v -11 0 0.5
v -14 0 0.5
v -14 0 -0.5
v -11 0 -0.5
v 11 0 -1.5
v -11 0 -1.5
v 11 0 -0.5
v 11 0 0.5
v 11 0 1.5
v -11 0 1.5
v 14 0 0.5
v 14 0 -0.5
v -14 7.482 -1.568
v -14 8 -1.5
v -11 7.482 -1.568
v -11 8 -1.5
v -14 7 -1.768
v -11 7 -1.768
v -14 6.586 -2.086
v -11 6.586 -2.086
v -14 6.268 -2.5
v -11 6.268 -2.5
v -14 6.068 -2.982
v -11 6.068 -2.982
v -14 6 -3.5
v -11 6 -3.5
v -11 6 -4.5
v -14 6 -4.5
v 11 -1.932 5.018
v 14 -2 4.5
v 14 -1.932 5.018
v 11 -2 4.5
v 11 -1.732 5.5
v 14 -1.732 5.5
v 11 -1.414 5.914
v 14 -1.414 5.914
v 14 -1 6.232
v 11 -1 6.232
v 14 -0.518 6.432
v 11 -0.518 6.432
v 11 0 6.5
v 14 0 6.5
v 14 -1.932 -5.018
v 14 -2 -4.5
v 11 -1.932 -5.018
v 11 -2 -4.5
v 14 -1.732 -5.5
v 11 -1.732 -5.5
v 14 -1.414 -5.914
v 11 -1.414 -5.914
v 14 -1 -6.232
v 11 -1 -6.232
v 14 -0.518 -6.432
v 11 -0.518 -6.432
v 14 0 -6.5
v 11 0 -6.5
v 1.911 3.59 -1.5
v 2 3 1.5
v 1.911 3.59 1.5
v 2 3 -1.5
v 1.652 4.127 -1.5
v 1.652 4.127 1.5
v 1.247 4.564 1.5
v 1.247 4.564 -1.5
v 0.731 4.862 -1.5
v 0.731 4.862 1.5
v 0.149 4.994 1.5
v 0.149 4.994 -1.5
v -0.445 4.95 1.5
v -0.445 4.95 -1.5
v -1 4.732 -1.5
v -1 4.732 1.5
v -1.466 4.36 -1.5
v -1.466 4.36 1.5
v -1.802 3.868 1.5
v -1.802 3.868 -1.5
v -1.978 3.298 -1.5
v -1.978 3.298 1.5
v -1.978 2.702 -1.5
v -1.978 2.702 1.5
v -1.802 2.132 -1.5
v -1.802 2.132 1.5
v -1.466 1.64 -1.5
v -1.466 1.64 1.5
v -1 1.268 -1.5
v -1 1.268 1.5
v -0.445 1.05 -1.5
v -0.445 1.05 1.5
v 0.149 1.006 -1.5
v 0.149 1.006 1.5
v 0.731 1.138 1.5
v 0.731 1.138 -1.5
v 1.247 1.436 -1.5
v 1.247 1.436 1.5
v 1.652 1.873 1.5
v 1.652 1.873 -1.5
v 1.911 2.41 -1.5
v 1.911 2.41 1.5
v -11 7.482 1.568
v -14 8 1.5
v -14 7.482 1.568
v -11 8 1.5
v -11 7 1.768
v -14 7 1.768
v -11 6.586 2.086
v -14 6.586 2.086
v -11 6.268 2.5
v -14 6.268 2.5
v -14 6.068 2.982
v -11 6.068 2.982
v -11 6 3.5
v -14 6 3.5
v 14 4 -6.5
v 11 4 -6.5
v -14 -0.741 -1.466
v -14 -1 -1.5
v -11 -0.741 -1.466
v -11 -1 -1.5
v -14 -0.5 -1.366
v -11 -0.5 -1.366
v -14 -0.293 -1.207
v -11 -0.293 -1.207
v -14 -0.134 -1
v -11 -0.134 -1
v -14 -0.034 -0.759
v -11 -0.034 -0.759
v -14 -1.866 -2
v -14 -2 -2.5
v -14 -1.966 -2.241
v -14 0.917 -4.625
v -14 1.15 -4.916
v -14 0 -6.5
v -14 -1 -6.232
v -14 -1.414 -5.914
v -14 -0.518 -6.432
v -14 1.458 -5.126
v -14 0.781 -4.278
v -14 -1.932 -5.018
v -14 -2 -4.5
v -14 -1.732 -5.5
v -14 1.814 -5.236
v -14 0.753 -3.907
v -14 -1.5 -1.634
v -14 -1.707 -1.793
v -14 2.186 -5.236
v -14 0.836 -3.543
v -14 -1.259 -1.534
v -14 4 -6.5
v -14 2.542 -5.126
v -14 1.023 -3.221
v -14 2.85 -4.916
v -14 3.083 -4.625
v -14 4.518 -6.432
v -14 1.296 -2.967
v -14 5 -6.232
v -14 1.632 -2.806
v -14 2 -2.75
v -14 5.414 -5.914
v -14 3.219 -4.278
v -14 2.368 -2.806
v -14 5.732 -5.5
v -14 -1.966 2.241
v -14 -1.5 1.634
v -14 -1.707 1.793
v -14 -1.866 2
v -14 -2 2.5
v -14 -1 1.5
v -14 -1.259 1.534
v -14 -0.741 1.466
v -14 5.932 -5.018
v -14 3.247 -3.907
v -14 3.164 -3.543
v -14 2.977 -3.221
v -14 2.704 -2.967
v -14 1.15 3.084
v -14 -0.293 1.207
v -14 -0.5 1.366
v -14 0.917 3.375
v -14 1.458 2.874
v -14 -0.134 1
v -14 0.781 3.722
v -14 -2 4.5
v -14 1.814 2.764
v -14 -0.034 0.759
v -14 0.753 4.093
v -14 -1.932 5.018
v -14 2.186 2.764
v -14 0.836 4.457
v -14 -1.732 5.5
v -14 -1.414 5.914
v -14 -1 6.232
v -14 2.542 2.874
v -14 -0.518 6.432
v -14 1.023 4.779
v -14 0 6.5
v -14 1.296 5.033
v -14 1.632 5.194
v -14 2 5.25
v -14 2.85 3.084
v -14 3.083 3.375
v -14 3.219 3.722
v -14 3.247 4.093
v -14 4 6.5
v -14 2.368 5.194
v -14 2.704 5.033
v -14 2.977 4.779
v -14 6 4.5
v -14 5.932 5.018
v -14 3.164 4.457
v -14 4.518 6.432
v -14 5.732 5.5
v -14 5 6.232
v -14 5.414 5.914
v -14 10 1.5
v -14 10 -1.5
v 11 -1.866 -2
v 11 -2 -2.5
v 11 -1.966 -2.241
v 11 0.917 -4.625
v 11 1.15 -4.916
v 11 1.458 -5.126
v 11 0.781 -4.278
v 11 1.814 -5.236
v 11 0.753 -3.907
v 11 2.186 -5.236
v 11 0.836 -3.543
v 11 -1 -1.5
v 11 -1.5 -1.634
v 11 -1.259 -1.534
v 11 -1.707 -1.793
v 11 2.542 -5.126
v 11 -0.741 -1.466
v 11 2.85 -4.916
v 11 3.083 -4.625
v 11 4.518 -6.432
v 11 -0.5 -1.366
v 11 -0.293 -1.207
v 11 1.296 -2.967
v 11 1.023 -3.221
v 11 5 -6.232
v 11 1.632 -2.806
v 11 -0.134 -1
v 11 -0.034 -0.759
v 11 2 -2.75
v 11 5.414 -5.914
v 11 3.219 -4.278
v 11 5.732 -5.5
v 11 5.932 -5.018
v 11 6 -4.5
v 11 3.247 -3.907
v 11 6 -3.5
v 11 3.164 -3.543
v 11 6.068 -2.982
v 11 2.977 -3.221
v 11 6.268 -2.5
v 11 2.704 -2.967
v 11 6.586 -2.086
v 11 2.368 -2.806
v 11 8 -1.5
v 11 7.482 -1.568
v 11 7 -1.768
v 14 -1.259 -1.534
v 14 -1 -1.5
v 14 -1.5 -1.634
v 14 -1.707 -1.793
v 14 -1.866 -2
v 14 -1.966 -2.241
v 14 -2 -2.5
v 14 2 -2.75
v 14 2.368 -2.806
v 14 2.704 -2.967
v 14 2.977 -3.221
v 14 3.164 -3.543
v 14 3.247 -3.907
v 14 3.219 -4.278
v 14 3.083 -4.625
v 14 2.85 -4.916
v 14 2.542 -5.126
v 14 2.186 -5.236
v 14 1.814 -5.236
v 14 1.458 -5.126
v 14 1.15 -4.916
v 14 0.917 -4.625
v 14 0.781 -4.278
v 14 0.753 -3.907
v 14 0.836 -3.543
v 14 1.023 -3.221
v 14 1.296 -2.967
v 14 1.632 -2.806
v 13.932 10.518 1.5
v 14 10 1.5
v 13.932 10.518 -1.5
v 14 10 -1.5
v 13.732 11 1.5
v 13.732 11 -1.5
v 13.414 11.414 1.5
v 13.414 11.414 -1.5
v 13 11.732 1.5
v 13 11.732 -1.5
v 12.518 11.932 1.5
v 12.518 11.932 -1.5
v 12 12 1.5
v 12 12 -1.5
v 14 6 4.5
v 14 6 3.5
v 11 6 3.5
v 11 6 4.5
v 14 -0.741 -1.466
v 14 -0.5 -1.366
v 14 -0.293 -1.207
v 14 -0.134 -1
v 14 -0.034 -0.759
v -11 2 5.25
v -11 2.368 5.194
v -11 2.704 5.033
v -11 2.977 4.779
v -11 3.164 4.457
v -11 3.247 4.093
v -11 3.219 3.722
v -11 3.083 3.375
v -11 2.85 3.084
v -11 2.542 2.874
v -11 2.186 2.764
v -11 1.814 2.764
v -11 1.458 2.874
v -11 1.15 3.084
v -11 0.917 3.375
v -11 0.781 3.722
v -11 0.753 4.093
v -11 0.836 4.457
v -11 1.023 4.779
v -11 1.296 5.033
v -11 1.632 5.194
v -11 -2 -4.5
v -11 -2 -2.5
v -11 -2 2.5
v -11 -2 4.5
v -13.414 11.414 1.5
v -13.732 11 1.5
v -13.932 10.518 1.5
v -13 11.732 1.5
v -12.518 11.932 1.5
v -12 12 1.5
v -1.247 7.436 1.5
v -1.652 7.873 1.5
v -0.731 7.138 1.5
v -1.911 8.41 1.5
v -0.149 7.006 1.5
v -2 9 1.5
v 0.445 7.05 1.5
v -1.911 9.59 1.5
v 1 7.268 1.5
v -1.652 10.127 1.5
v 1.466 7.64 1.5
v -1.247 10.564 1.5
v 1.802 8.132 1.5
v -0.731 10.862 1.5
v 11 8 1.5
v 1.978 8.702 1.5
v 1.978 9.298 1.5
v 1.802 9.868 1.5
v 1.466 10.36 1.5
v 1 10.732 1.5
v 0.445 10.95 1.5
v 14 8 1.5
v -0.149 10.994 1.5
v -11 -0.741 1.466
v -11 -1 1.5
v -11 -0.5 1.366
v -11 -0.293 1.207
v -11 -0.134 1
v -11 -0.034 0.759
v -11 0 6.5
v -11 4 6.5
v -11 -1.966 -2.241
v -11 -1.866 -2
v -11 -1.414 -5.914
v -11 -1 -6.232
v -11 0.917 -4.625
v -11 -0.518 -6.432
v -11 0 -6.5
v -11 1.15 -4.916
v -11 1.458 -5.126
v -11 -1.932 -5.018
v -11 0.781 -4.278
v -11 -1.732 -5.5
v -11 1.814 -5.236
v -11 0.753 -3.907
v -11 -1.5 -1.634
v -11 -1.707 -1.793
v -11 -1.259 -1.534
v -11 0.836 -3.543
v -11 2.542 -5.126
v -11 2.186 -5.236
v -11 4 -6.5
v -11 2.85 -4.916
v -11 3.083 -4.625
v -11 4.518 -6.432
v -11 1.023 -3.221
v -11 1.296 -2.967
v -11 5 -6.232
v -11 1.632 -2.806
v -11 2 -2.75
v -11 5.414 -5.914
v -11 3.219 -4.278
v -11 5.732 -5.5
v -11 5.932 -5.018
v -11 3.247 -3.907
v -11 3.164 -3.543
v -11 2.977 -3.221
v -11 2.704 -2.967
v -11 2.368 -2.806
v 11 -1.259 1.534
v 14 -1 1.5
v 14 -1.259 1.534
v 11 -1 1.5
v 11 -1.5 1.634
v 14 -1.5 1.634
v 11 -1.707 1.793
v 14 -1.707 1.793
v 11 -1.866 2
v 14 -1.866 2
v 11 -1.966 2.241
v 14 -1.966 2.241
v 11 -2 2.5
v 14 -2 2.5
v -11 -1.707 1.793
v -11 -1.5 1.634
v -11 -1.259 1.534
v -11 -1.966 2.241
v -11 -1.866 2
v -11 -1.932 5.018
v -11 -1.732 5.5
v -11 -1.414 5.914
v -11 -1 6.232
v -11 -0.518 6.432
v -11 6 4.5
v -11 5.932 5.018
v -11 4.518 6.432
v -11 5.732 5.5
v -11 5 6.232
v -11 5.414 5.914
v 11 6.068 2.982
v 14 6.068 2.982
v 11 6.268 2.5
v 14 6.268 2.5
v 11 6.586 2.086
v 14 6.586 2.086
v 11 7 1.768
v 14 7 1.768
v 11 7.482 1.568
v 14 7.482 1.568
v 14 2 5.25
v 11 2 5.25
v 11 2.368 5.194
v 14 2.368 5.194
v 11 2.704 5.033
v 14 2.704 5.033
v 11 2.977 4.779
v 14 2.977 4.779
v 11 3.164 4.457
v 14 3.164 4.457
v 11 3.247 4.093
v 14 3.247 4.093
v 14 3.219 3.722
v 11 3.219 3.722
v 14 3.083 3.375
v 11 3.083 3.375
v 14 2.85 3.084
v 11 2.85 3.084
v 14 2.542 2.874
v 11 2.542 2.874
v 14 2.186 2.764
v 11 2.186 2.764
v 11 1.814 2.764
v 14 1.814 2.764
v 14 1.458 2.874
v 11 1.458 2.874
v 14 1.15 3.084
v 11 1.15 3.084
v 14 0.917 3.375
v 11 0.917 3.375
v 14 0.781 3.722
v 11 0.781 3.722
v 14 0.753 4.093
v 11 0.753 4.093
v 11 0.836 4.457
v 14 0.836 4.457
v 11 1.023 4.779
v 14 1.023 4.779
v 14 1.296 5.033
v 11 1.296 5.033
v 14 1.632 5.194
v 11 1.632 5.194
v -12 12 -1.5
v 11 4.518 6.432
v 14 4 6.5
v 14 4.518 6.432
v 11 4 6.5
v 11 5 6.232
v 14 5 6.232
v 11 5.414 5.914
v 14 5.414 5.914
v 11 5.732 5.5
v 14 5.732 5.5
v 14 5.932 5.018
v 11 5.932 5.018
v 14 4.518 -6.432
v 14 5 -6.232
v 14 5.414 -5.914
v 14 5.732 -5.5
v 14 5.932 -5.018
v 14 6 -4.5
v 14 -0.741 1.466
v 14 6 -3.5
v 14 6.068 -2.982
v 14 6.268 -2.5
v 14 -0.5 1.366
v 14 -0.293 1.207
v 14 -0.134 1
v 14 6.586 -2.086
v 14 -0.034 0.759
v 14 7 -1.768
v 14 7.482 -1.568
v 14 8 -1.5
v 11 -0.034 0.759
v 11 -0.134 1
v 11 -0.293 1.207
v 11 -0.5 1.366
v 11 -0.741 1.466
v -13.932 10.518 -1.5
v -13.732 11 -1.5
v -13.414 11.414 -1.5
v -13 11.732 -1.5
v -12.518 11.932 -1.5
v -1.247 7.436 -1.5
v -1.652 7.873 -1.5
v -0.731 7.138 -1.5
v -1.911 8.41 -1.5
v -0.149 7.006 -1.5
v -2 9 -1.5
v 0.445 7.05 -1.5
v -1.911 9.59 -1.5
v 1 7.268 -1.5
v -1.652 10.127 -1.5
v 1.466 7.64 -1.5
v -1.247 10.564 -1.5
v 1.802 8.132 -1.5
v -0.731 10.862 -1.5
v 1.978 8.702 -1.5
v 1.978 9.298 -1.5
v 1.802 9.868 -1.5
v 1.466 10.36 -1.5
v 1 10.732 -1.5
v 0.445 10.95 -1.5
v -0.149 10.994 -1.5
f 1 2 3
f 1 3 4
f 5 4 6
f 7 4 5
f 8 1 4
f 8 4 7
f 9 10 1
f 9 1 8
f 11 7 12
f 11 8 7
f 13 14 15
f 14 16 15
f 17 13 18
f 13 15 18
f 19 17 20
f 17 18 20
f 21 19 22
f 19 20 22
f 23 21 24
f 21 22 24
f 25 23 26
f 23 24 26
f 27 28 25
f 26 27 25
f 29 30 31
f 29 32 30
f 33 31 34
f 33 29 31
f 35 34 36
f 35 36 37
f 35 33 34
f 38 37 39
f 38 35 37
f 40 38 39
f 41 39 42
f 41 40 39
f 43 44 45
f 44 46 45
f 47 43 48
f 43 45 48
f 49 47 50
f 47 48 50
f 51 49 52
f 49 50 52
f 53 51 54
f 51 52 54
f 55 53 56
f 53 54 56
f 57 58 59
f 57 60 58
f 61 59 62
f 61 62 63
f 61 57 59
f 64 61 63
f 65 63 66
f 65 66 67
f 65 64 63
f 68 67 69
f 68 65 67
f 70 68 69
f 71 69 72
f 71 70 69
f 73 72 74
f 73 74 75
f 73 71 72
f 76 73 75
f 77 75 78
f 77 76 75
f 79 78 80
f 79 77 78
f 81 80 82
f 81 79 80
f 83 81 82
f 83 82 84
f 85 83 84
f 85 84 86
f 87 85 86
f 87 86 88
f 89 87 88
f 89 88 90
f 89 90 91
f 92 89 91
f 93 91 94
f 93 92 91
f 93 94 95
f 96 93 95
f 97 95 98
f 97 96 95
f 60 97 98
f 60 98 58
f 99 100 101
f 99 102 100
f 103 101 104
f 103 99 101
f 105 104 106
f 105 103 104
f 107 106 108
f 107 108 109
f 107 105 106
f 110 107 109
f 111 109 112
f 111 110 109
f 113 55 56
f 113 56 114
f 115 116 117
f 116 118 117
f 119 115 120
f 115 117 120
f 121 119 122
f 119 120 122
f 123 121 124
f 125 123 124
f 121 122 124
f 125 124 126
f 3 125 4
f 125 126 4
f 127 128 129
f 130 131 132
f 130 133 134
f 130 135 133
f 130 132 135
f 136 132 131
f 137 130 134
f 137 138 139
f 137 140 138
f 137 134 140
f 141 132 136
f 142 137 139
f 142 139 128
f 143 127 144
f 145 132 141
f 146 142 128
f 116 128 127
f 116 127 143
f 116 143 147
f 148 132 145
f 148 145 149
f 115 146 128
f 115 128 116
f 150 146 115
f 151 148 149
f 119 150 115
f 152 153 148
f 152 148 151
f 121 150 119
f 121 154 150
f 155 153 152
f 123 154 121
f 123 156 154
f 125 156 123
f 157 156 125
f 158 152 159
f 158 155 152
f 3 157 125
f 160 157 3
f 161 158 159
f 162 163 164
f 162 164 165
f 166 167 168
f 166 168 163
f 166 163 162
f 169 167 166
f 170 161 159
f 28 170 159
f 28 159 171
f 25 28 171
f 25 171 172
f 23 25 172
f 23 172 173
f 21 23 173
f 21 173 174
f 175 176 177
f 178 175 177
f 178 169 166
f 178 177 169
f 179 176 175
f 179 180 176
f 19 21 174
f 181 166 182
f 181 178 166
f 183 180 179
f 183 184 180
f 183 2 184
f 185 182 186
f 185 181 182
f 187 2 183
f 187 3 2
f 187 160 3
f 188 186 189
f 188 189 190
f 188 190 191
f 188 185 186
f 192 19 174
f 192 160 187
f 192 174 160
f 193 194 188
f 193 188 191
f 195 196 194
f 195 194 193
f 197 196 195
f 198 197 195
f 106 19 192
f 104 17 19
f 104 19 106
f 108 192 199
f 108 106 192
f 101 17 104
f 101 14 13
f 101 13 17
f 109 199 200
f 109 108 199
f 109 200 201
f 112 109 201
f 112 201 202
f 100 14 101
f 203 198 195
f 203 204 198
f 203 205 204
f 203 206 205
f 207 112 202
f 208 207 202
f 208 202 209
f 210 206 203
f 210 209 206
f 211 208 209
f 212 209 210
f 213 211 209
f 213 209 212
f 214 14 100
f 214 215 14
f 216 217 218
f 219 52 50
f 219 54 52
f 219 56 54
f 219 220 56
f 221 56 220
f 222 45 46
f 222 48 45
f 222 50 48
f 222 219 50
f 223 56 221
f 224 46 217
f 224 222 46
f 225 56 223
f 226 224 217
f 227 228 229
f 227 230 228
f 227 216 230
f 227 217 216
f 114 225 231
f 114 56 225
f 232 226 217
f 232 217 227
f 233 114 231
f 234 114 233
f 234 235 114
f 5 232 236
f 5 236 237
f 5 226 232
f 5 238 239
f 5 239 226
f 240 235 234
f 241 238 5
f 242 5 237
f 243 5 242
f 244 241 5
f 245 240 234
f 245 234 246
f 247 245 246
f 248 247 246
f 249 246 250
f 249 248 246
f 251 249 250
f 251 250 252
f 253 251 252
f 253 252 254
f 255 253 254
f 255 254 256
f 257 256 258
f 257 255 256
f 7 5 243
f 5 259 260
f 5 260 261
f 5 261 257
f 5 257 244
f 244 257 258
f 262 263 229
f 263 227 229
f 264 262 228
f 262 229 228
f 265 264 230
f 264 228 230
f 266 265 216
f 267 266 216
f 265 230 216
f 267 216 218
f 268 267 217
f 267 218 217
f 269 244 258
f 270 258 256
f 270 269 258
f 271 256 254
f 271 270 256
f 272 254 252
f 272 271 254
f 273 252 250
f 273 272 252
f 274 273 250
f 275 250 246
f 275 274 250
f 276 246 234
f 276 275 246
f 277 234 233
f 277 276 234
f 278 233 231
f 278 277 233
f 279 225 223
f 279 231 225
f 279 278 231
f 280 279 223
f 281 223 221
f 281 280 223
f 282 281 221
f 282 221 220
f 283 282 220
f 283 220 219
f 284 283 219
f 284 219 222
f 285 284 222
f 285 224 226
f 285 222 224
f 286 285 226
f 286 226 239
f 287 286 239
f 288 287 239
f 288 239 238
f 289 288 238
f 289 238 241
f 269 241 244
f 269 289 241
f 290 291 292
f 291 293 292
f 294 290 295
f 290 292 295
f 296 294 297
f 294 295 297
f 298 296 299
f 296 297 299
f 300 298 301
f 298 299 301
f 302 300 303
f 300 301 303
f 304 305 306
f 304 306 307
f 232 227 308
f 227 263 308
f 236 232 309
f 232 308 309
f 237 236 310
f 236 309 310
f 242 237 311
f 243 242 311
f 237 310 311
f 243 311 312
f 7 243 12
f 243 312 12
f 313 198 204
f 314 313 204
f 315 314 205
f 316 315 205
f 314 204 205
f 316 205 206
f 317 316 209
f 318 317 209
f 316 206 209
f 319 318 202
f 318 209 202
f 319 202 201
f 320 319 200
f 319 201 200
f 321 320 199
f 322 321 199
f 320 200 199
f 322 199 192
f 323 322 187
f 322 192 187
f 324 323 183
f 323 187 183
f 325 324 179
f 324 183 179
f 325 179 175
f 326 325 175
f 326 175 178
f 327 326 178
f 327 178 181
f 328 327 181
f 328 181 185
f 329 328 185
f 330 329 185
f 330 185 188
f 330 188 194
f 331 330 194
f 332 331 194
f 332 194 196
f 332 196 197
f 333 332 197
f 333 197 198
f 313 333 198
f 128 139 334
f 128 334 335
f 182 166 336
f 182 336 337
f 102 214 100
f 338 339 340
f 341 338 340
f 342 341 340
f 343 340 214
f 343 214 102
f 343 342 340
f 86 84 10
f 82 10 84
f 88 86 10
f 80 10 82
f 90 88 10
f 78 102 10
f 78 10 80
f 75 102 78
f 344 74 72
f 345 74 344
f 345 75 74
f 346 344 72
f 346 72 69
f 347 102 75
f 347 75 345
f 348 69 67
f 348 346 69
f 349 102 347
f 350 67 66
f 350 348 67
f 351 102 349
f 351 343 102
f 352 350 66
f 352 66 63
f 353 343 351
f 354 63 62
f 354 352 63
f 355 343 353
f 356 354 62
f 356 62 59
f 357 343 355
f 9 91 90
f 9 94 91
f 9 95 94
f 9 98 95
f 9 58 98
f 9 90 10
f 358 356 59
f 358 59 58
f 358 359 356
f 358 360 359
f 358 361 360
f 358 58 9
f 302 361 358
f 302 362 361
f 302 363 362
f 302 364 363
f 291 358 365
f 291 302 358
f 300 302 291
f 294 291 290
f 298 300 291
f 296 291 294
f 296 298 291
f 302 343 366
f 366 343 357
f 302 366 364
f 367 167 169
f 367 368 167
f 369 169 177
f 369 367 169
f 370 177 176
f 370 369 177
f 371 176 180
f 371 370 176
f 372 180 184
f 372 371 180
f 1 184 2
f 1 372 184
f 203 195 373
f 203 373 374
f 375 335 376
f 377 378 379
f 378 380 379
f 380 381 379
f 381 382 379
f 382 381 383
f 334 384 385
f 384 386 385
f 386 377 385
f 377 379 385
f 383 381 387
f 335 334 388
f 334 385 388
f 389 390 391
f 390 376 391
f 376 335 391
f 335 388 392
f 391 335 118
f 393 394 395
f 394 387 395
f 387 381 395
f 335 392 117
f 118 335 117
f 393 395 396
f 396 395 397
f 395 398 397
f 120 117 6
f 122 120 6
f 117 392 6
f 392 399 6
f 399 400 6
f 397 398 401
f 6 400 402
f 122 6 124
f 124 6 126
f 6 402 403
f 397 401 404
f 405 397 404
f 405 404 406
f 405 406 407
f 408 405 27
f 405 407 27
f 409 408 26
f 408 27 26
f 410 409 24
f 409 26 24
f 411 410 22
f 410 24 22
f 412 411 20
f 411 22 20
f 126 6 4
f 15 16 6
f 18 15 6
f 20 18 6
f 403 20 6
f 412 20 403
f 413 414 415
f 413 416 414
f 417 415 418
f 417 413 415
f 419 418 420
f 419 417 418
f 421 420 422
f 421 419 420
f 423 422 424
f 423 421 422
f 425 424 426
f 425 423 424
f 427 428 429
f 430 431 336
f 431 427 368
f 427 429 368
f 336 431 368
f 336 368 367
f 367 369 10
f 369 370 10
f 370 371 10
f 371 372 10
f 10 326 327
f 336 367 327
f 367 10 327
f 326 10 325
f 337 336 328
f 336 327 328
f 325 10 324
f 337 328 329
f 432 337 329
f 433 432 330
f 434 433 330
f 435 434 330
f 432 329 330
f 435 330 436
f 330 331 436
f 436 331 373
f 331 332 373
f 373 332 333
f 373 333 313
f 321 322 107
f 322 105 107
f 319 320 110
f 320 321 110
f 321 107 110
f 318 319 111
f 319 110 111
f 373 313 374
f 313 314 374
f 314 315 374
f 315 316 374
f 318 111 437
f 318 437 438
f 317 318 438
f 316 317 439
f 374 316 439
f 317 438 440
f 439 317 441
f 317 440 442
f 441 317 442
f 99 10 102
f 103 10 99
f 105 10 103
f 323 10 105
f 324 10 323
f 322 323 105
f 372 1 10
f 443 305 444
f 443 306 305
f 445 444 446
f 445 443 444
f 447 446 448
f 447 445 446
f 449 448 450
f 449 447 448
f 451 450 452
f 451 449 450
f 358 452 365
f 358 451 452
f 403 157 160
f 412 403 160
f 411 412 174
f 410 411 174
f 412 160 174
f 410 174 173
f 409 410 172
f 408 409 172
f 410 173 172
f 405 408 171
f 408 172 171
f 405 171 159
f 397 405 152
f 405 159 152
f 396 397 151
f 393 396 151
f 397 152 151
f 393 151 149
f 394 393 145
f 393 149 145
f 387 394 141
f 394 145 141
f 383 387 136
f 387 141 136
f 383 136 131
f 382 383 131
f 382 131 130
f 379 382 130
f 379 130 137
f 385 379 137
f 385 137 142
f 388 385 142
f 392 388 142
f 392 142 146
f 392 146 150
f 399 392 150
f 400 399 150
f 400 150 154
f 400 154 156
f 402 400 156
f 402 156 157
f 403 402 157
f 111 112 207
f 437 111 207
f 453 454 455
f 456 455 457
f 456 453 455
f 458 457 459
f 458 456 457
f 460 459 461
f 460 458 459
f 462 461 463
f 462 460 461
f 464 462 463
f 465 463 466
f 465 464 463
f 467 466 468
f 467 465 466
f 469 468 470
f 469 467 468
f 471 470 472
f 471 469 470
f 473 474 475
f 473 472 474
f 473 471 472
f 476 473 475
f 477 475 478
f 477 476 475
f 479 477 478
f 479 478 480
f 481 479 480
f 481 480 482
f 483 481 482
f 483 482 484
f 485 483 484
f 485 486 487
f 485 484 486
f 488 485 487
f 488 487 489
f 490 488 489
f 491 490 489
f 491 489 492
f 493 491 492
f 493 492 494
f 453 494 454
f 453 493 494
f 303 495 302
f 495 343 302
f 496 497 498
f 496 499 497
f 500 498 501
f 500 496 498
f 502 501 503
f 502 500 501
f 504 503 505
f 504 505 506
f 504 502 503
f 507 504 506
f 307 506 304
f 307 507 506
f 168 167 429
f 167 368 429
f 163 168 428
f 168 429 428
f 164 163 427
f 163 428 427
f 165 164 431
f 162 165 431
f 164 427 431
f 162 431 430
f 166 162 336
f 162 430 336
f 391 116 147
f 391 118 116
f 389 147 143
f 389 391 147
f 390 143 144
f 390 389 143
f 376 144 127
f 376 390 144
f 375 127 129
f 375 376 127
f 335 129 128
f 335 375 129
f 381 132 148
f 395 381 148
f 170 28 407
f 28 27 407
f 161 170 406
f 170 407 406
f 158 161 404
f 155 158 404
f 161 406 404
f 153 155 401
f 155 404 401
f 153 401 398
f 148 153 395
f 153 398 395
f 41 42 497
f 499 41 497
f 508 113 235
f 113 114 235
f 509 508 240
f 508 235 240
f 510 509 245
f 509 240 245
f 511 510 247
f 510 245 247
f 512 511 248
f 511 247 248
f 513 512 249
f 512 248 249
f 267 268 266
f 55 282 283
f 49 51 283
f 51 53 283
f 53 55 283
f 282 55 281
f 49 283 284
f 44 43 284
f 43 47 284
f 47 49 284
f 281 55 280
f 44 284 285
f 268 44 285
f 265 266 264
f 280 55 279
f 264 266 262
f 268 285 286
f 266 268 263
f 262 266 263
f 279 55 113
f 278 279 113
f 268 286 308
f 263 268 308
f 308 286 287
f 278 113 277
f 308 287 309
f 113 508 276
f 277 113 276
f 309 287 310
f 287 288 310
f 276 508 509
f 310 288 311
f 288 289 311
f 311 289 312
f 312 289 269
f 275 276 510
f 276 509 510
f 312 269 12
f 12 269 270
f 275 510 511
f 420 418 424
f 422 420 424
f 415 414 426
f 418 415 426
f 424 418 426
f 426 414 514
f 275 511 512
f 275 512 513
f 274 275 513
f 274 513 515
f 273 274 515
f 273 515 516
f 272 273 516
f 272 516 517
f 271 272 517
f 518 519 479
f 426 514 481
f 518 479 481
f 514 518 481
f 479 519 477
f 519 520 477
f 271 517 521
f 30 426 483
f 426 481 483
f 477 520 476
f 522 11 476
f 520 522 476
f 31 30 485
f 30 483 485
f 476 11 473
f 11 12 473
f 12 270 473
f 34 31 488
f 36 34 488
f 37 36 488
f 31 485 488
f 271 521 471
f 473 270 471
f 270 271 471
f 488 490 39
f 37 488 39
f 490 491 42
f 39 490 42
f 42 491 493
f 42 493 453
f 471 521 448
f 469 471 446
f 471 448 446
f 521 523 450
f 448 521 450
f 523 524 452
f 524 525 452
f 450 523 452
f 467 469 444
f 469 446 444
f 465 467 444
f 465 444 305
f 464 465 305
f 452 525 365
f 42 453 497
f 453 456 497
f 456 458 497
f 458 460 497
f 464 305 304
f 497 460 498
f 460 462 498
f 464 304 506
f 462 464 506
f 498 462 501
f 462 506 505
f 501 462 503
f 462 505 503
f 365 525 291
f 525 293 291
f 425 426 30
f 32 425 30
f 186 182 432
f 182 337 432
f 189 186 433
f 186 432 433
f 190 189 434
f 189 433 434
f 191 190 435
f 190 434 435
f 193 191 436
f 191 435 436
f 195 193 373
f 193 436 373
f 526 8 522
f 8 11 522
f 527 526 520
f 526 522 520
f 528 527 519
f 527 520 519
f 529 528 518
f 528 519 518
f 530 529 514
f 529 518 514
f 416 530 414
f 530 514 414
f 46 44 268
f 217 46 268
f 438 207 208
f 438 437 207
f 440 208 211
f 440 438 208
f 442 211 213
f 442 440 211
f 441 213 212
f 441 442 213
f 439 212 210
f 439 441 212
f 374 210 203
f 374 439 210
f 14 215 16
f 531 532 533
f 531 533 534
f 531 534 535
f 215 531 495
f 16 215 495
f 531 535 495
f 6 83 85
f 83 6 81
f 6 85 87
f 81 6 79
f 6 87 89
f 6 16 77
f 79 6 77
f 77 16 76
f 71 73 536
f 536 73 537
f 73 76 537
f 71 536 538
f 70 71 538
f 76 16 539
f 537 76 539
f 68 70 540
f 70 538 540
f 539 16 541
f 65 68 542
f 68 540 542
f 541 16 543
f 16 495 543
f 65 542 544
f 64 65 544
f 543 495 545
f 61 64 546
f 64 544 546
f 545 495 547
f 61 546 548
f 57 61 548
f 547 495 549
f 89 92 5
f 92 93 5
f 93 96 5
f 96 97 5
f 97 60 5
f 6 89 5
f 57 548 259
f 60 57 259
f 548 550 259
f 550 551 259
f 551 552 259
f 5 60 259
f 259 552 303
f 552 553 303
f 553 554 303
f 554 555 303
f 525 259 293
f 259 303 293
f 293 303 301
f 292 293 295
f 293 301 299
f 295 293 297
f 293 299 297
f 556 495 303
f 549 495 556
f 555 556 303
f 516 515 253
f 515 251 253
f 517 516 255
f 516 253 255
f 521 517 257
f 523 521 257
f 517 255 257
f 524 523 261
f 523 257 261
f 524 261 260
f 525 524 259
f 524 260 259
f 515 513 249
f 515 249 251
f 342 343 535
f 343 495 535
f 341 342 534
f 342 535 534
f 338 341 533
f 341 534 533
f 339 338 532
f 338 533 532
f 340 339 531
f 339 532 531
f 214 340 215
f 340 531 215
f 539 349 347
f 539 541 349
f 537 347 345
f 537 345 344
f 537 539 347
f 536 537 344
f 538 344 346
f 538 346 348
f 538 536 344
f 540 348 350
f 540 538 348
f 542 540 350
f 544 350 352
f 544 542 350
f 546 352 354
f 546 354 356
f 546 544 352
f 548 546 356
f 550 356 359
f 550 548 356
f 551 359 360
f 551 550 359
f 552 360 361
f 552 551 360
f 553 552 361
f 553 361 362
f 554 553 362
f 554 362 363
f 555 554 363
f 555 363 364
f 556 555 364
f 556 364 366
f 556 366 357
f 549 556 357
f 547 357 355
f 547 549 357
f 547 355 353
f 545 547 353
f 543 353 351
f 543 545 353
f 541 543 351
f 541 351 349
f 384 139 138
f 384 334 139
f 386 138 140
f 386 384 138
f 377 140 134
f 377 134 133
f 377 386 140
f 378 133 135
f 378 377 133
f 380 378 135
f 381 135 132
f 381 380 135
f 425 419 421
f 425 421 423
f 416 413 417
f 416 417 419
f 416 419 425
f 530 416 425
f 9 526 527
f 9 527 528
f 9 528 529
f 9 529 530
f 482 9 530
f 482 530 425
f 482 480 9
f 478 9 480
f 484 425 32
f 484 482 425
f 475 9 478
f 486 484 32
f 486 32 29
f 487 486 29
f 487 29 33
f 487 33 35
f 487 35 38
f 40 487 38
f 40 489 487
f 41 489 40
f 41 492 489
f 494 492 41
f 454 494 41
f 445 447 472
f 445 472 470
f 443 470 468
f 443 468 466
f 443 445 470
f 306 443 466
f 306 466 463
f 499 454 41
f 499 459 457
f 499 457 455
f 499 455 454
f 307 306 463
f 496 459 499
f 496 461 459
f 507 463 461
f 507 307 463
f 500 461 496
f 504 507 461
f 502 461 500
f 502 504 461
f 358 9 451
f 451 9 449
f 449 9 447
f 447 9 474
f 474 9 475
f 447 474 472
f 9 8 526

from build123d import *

# Parameters (mm, degrees)
SKETCH_1_W          = 28
SKETCH_1_H          = 12
SKETCH_1_R          = 2
EXTRUDE_1_DEPTH     = 1.5
SKETCH_2_W          = 5
SKETCH_2_H          = 8
EXTRUDE_2_DEPTH     = 3
SKETCH_4_R          = 1.25
CUT_EXTRUDE_2_DEPTH = 5
FILLET_1_R          = 2
FILLET_2_R          = 1


with BuildPart() as part:
    # 草图1 → 凸台-拉伸1 (new, symmetric)
    with BuildSketch(Plane.XY):
        with Locations((0, 6)):
            Rectangle(SKETCH_1_W, SKETCH_1_H)
        with Locations((0, 3)):
            Circle(SKETCH_1_R, mode=Mode.SUBTRACT)
        with Locations(Location((0, 9, 0), (0, 0, 180))):
            Circle(SKETCH_1_R, mode=Mode.SUBTRACT)
    extrude(amount=EXTRUDE_1_DEPTH, both=True)

    # 草图2 → 凸台-拉伸2 (add)
    with BuildSketch(Plane.ZY.offset(14)):
        with Locations((4, 2)):
            Rectangle(SKETCH_2_W, SKETCH_2_H)
        with Locations((-4, 2)):
            Rectangle(SKETCH_2_W, SKETCH_2_H)
    extrude_2 = extrude(amount=-EXTRUDE_2_DEPTH)

    # 草图4 → 切除-拉伸2 (cut)
    with BuildSketch(Plane.ZY.offset(14)):
        with Locations((4, 2)):
            Circle(SKETCH_4_R)
        with Locations((-4, 2)):
            Circle(SKETCH_4_R)
    cut_extrude_2 = extrude(amount=-CUT_EXTRUDE_2_DEPTH, mode=Mode.SUBTRACT)

    # 镜向1: 凸台-拉伸2, 切除-拉伸2 across plane
    add(extrude_2.mirror(Plane(origin=(0, 0, 0), x_dir=(0, 0, 1), z_dir=(1, 0, 0))))
    add(cut_extrude_2.mirror(Plane(origin=(0, 0, 0), x_dir=(0, 0, 1), z_dir=(1, 0, 0))), mode=Mode.SUBTRACT)

    # 圆角1
    fillet_1_edges = [part.edges().sort_by_distance(p)[0] for p in [
        (-12.5, 6, 1.5),
        (-12.5, 6, 6.5),
        (-12.5, -2, 6.5),
        (-12.5, 6, -6.5),
        (-12.5, 6, -1.5),
        (-12.5, -2, -6.5),
        (12.5, 6, 1.5),
        (12.5, -2, 6.5),
        (12.5, 6, 6.5),
        (-14, 12, 0),
        (12.5, 6, -1.5),
        (14, 12, 0),
        (12.5, 6, -6.5),
        (12.5, -2, -6.5),
    ]]
    fillet(fillet_1_edges, radius=FILLET_1_R)

    # 圆角2
    fillet_2_edges = [part.edges().sort_by_distance(p)[0] for p in [
        (12.5, 0, -1.5),
        (12.5, 0, 1.5),
        (-12.5, 0, 1.5),
        (-12.5, 0, -1.5),
    ]]
    fillet(fillet_2_edges, radius=FILLET_2_R)
    fillet_2_2_edges = [part.edges().sort_by_distance(p)[0] for p in [
        (12.5, -2, -1.5),
        (12.5, -2, 1.5),
        (-12.5, -2, 1.5),
        (-12.5, -2, -1.5),
    ]]
    fillet(fillet_2_2_edges, radius=FILLET_2_R - 0.0001)  # a hair under: the kernel refuses the full size


solid = part.part
